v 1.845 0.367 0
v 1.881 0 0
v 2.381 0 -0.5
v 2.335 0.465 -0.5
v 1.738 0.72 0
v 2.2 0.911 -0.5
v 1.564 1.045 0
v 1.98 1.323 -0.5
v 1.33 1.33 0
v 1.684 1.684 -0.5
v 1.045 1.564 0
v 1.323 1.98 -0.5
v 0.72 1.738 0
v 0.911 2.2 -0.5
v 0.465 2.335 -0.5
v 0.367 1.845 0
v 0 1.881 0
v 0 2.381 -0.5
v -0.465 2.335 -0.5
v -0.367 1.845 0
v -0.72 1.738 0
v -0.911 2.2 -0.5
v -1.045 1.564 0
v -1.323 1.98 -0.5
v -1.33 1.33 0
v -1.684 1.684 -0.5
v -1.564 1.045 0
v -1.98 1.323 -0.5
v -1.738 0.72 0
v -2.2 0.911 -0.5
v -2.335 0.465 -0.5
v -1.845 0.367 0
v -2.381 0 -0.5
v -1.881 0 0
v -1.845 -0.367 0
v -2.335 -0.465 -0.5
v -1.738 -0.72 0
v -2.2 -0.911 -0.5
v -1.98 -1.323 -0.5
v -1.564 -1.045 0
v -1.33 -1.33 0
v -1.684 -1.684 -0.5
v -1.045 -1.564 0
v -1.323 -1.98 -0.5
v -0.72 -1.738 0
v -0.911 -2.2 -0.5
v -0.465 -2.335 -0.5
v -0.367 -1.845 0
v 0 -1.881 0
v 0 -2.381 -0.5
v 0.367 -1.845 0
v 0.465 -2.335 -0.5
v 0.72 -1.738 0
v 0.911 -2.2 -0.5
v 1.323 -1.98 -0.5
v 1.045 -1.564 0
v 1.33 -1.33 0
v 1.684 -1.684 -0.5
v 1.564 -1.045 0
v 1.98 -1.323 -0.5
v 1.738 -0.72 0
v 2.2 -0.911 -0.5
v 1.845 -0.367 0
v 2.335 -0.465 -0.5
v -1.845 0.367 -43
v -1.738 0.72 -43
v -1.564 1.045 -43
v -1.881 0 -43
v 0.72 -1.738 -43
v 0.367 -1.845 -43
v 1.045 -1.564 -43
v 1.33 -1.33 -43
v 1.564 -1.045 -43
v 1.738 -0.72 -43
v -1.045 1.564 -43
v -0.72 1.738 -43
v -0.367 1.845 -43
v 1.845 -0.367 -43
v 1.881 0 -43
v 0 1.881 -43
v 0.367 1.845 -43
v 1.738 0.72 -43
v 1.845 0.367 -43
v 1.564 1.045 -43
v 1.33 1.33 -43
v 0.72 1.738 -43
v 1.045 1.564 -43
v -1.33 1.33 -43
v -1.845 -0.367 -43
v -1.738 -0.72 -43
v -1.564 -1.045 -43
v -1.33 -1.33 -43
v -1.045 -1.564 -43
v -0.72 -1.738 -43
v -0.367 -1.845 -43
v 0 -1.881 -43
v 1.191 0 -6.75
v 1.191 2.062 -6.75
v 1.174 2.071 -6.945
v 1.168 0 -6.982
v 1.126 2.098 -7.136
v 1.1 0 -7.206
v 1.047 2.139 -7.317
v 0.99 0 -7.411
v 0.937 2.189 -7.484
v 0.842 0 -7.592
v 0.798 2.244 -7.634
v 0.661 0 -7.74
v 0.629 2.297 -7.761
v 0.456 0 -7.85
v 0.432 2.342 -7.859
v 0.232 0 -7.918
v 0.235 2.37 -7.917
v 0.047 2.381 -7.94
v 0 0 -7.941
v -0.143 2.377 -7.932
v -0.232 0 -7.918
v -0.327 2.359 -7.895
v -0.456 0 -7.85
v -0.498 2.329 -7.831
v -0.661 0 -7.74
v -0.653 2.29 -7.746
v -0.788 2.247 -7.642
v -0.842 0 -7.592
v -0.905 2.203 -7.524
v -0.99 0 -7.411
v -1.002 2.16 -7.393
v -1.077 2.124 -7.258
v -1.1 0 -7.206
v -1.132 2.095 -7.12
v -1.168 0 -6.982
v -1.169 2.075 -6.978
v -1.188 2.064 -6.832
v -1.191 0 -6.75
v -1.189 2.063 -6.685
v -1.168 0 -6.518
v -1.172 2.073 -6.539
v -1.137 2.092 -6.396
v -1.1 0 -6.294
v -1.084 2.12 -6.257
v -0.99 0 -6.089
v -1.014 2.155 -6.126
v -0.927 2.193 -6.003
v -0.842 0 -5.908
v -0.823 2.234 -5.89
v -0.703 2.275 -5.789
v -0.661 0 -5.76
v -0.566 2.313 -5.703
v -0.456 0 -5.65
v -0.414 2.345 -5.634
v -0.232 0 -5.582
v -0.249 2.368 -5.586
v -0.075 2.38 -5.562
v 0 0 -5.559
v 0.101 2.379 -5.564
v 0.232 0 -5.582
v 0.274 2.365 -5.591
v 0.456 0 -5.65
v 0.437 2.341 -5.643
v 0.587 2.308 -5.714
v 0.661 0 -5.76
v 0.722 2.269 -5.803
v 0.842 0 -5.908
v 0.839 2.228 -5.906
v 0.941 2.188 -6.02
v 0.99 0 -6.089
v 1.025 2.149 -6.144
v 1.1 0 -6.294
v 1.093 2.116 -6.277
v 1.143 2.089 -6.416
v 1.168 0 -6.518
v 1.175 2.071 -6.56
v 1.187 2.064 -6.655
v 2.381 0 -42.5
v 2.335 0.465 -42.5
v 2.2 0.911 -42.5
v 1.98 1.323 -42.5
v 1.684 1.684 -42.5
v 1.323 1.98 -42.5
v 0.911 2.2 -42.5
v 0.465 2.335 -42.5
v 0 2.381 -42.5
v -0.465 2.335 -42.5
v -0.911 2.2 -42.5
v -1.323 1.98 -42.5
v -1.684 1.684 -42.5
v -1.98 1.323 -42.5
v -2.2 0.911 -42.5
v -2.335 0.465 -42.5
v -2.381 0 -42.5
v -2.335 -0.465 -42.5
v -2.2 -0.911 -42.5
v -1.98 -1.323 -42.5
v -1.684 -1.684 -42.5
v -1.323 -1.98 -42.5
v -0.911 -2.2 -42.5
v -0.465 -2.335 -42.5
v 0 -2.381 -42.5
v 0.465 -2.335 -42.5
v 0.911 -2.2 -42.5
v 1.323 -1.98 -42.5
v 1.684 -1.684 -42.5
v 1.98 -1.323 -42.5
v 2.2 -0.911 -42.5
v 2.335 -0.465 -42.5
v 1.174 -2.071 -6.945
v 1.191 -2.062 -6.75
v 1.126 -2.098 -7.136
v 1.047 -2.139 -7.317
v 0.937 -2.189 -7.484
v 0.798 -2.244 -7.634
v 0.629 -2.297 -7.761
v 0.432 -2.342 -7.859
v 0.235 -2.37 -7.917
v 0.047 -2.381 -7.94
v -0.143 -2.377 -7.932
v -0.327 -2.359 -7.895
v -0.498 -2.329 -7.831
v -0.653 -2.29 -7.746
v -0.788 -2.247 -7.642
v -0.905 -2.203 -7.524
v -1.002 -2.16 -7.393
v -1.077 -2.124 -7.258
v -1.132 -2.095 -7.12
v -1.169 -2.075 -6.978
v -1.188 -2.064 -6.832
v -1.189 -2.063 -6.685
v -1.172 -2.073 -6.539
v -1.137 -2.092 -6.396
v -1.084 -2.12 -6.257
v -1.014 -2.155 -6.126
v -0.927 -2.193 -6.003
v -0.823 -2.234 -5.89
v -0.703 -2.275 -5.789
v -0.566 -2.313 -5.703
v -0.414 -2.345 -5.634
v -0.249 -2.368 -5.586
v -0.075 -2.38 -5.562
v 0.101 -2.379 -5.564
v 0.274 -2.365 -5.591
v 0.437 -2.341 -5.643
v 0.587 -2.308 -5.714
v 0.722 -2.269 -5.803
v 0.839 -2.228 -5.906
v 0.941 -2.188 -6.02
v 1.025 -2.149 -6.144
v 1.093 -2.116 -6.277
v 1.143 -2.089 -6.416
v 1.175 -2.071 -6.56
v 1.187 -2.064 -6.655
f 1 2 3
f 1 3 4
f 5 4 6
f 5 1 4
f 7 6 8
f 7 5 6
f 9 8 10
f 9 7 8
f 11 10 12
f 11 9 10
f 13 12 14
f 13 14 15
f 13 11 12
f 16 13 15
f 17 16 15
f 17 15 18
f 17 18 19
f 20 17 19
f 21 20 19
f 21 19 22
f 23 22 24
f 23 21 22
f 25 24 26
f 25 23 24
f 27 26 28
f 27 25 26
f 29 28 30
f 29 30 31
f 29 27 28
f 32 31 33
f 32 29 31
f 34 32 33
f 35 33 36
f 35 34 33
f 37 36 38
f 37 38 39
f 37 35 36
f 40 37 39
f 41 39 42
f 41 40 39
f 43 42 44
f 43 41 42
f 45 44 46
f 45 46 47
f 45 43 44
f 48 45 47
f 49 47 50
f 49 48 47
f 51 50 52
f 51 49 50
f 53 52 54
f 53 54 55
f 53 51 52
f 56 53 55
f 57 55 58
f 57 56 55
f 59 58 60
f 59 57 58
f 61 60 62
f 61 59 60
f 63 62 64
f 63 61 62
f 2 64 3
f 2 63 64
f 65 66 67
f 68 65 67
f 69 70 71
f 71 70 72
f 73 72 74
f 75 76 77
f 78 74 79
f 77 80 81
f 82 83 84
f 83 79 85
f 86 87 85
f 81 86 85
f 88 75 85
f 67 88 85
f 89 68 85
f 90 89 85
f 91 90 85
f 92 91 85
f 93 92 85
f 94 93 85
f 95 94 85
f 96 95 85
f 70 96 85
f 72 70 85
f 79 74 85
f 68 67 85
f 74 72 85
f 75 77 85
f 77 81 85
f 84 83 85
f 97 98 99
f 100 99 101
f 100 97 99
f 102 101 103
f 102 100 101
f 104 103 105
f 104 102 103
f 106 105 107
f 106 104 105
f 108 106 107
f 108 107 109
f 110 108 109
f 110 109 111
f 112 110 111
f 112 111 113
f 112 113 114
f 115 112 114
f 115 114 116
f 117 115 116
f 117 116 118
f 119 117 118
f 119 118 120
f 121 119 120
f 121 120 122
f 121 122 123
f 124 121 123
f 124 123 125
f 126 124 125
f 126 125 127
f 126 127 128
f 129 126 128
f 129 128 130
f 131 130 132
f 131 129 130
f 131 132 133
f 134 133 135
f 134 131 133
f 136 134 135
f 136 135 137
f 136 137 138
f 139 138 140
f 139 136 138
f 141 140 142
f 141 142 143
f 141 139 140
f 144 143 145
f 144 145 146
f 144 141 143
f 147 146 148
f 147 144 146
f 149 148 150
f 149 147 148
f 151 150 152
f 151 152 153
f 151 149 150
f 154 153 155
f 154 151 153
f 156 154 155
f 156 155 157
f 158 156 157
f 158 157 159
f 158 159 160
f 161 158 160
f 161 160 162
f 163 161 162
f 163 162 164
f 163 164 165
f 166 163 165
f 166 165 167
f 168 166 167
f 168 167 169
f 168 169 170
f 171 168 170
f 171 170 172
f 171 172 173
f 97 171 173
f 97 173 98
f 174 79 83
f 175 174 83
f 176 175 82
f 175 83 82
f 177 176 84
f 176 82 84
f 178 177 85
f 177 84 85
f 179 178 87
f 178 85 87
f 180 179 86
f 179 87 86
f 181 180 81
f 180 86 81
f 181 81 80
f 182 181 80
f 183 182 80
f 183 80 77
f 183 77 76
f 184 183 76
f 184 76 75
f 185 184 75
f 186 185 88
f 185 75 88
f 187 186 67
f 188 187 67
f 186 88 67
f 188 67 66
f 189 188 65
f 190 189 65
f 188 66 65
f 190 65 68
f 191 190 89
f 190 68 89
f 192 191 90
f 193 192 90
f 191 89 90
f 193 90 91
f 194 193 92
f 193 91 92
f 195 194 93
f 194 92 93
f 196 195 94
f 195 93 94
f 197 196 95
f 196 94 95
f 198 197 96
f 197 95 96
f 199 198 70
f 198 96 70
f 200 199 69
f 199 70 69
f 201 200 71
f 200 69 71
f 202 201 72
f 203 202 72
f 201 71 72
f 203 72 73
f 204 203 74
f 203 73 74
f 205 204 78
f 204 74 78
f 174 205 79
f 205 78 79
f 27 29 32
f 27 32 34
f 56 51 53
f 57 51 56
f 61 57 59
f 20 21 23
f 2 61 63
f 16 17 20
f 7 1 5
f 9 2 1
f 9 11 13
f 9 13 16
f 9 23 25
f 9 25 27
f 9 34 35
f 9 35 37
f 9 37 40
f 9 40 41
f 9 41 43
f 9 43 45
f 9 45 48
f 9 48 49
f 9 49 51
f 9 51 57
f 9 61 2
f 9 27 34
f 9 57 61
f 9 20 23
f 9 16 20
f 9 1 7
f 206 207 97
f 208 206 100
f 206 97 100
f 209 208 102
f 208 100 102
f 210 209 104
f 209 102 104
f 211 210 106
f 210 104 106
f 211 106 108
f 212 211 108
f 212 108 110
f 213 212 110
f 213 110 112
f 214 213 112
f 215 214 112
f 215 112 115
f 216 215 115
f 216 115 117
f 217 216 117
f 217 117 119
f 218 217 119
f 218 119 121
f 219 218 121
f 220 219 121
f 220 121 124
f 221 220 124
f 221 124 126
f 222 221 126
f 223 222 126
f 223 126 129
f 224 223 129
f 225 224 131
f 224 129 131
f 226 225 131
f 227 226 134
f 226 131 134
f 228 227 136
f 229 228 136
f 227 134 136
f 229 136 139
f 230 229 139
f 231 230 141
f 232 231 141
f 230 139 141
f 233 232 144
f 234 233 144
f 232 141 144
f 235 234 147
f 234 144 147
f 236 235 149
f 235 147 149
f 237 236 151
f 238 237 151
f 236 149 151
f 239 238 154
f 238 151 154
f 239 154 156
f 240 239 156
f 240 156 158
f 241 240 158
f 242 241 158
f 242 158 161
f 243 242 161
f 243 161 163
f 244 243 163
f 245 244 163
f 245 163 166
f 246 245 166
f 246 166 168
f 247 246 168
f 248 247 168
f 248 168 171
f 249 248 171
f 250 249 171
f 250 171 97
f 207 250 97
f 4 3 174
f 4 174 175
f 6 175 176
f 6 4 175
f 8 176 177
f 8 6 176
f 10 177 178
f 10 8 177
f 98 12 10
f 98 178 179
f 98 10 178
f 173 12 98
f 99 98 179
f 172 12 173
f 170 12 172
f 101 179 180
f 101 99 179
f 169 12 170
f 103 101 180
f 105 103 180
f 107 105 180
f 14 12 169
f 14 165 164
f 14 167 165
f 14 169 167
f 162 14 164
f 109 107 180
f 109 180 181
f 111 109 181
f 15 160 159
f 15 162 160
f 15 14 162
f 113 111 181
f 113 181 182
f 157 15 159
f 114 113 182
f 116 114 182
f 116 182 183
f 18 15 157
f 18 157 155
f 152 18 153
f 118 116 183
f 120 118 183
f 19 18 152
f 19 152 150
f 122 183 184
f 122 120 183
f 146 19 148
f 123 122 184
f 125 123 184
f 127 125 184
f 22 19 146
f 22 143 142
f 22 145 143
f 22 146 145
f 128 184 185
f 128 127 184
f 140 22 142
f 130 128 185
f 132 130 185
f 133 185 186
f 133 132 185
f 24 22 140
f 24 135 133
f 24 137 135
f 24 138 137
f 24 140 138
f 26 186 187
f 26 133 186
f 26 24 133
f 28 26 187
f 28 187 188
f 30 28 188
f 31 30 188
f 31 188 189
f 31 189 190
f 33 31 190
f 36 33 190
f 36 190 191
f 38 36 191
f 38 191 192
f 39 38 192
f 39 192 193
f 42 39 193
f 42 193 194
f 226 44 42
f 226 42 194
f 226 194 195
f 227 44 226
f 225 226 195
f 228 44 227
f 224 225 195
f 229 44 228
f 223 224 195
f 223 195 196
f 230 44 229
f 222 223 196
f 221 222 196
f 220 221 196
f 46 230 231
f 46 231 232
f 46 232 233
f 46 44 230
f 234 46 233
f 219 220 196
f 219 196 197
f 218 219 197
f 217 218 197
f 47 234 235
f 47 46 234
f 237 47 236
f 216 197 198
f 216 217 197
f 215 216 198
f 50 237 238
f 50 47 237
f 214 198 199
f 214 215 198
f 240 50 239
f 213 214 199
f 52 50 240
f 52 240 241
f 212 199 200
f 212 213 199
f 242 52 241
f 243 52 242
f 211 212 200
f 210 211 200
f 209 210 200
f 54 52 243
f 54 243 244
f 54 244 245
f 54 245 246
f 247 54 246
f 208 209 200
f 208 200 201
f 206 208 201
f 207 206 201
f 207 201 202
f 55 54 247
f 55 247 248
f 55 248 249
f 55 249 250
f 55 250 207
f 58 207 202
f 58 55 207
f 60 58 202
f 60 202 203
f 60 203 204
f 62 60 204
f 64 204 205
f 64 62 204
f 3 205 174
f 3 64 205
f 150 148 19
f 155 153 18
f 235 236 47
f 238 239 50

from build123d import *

# Parameters (mm, degrees)
SKETCH1_R               = 2.38125
BOSS_EXTRUDE1_DEPTH     = 43
SKETCH2_R               = 1.190625
CUT_EXTRUDE1_DEPTH      = 3.38125
CUT_EXTRUDE1_DEPTH_BACK = 3.38125
CHAMFER1_SIZE           = 0.5


with BuildPart() as part:
    # Sketch1 → Boss-Extrude1 (new body)
    with BuildSketch(Plane.XY):
        Circle(SKETCH1_R)
    extrude(amount=-BOSS_EXTRUDE1_DEPTH)

    # Sketch2 → Cut-Extrude1 (cut, two sides)
    with BuildSketch(Plane(origin=(0, 0, 0), x_dir=(1, 0, 0), z_dir=(0, 1, 0))) as cut_extrude1_sk:
        with Locations((0, 6.75)):
            Circle(SKETCH2_R)
    extrude(amount=CUT_EXTRUDE1_DEPTH, mode=Mode.SUBTRACT)
    extrude(cut_extrude1_sk.sketch, amount=-CUT_EXTRUDE1_DEPTH_BACK, mode=Mode.SUBTRACT)

    # Chamfer1
    chamfer1_edges = [part.edges().sort_by_distance(p)[0] for p in [
        (-2.38125, 0, 0),
        (-2.38125, 0, -43),
    ]]
    chamfer(chamfer1_edges, length=CHAMFER1_SIZE)


solid = part.part
